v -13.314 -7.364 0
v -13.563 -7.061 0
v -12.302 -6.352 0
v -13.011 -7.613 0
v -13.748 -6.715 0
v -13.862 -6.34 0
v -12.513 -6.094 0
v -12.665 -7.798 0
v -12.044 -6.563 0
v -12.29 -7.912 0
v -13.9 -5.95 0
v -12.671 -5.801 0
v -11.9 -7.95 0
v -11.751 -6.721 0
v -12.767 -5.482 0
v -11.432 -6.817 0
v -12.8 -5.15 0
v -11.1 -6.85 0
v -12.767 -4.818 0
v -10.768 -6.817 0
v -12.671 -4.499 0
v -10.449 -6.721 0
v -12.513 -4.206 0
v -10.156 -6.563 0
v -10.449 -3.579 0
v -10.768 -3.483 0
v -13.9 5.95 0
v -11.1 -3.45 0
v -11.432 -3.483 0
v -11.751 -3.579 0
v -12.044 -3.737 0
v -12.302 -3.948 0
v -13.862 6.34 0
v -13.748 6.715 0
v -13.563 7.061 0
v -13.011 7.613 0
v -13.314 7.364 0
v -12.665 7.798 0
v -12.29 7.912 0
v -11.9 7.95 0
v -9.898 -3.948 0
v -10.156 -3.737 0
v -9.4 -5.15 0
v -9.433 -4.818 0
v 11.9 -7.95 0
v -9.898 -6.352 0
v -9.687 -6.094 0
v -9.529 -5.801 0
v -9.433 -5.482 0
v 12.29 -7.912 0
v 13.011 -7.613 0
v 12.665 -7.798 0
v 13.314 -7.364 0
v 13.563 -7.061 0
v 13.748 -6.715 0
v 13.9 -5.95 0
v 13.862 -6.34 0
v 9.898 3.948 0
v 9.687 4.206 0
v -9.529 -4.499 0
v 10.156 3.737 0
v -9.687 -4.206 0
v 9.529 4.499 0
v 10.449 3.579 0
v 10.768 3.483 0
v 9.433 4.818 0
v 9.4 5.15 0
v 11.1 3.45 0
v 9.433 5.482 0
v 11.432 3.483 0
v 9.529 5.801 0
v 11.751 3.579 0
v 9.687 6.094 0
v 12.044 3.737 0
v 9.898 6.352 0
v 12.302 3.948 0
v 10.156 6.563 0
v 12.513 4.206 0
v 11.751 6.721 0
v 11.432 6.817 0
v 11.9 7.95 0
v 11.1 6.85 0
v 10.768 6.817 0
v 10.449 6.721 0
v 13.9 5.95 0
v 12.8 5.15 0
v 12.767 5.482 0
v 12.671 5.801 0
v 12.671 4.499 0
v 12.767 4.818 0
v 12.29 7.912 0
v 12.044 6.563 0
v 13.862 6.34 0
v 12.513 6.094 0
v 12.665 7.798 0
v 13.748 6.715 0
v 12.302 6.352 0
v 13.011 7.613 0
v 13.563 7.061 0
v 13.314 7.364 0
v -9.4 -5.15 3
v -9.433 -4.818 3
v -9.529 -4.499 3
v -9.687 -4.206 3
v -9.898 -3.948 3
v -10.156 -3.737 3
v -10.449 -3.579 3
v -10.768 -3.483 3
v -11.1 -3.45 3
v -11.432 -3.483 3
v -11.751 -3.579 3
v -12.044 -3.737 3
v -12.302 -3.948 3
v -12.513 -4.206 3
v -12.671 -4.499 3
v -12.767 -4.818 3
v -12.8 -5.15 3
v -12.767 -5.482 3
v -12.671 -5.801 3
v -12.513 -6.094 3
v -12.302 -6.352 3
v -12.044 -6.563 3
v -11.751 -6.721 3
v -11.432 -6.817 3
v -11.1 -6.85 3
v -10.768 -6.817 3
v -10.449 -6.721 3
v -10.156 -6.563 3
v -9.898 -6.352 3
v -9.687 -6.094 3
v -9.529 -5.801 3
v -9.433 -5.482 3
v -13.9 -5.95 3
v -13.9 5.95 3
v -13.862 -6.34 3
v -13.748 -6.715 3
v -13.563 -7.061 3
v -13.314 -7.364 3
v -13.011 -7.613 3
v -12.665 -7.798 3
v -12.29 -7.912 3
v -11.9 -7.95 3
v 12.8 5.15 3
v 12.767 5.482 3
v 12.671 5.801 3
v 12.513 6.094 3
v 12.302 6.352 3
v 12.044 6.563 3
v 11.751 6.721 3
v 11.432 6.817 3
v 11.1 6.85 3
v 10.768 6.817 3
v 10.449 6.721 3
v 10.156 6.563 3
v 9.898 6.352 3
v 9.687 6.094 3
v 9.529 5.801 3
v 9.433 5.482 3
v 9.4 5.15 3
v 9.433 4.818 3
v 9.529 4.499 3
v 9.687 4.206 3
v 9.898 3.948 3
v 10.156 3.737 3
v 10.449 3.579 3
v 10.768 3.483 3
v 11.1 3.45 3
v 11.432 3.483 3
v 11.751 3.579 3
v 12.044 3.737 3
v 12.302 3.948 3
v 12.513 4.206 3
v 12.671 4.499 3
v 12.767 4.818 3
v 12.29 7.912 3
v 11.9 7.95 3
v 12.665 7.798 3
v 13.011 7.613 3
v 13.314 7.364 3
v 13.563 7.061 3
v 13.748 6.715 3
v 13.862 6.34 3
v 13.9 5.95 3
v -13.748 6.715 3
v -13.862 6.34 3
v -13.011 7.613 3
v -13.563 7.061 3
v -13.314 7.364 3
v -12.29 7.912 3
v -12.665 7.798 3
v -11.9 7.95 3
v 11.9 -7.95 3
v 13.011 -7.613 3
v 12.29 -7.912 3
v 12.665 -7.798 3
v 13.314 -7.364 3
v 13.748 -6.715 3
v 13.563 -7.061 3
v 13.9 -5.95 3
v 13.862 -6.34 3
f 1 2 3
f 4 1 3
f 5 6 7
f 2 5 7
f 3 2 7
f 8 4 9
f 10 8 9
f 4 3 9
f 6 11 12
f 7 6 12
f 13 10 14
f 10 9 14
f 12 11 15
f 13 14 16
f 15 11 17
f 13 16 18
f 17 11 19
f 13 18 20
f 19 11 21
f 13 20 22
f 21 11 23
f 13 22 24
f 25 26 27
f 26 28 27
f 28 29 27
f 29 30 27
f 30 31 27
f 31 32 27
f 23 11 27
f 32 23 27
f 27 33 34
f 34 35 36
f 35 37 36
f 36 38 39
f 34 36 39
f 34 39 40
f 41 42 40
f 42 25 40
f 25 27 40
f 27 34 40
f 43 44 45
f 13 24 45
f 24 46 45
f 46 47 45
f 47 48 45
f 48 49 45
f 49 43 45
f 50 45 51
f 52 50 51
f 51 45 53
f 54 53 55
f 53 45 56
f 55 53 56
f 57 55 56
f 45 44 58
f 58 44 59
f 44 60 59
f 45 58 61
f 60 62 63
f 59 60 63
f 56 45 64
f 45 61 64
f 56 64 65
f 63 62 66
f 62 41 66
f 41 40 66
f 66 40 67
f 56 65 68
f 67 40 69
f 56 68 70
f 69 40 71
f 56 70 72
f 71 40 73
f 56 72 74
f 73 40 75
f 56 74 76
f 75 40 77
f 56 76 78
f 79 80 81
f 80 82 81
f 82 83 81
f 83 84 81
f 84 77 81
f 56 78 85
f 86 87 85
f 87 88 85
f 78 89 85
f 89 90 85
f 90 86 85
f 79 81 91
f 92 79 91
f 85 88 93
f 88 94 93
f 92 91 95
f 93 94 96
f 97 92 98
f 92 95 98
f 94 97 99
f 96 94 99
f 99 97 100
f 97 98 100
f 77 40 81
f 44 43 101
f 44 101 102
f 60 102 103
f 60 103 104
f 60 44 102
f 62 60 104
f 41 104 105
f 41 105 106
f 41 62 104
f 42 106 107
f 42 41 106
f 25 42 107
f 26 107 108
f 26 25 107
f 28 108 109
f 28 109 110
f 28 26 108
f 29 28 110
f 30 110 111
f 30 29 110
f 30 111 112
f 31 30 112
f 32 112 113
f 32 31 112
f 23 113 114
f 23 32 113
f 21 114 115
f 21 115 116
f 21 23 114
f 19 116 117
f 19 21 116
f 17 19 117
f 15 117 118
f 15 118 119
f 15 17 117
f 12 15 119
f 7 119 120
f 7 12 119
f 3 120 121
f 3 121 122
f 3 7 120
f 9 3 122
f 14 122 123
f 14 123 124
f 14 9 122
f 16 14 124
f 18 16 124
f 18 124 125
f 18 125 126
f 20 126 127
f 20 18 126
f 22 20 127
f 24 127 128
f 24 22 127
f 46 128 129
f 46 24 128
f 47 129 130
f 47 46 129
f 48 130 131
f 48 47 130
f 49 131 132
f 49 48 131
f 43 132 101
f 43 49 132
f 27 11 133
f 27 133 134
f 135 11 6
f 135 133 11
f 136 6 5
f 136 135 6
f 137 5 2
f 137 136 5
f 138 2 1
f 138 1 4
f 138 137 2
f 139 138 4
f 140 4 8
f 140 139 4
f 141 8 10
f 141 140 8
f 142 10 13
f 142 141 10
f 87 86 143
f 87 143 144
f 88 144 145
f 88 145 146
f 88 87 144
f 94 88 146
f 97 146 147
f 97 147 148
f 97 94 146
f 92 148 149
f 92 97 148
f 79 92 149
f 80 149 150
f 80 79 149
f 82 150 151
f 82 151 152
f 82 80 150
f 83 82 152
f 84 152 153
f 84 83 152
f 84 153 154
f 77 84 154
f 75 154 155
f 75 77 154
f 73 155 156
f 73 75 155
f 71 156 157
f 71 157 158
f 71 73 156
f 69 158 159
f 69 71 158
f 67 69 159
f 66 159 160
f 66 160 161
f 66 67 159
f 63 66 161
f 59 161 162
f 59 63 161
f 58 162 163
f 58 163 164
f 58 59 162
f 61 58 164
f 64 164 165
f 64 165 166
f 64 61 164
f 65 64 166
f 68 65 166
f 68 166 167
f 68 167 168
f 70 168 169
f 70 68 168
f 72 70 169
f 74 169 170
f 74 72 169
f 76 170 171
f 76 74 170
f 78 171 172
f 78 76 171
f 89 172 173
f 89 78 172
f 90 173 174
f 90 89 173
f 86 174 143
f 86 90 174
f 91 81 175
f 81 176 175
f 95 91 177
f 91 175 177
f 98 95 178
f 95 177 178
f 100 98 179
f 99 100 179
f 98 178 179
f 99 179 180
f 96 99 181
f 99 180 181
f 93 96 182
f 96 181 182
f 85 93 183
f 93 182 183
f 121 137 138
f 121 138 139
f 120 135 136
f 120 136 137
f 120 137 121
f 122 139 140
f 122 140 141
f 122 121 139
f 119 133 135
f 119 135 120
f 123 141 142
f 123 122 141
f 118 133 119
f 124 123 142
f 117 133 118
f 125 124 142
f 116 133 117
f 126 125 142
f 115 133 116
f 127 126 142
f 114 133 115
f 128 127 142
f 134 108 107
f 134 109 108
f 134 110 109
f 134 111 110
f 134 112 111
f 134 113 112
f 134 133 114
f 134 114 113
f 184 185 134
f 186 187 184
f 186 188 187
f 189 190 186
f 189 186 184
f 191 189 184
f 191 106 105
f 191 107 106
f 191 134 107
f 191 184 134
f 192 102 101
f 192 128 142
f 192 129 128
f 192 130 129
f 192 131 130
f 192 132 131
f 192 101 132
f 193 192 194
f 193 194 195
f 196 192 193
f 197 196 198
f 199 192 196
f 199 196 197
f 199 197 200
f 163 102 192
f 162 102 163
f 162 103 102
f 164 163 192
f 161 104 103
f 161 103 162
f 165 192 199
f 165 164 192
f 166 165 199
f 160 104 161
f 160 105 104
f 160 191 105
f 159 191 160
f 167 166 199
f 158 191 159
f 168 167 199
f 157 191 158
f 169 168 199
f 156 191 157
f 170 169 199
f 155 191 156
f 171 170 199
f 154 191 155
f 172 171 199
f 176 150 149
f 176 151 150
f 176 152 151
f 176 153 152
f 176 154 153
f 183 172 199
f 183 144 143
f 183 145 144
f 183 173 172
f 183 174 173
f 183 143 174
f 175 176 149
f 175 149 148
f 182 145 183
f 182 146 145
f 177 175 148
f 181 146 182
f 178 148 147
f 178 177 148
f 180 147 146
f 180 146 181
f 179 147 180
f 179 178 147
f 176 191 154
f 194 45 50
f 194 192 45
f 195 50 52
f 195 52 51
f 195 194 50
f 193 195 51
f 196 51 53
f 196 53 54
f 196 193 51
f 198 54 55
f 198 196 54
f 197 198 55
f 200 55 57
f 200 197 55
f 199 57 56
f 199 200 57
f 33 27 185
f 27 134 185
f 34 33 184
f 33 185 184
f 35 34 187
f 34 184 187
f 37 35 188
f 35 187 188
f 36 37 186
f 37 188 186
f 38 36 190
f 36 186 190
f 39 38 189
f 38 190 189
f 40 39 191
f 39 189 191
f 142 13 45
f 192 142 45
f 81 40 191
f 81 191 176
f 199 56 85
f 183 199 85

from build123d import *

# Parameters (mm, degrees)
SKETCH_W  = 27.8
SKETCH_H  = 15.9
SKETCH_R  = 1.7
PAD_DEPTH = 3
FILLET_R  = 2


with BuildPart() as part:
    # Sketch → Pad (new body)
    with BuildSketch(Plane.XY):
        Rectangle(SKETCH_W, SKETCH_H)
        with Locations((-11.1, -5.15)):
            Circle(SKETCH_R, mode=Mode.SUBTRACT)
        with Locations((11.1, 5.15)):
            Circle(SKETCH_R, mode=Mode.SUBTRACT)
    extrude(amount=PAD_DEPTH)

    # Fillet
    fillet_edges = [part.edges().sort_by_distance(p)[0] for p in [
        (13.9, -7.95, 1.5),
        (13.9, 7.95, 1.5),
        (-13.9, -7.95, 1.5),
        (-13.9, 7.95, 1.5),
    ]]
    fillet(fillet_edges, radius=FILLET_R)


solid = part.part
